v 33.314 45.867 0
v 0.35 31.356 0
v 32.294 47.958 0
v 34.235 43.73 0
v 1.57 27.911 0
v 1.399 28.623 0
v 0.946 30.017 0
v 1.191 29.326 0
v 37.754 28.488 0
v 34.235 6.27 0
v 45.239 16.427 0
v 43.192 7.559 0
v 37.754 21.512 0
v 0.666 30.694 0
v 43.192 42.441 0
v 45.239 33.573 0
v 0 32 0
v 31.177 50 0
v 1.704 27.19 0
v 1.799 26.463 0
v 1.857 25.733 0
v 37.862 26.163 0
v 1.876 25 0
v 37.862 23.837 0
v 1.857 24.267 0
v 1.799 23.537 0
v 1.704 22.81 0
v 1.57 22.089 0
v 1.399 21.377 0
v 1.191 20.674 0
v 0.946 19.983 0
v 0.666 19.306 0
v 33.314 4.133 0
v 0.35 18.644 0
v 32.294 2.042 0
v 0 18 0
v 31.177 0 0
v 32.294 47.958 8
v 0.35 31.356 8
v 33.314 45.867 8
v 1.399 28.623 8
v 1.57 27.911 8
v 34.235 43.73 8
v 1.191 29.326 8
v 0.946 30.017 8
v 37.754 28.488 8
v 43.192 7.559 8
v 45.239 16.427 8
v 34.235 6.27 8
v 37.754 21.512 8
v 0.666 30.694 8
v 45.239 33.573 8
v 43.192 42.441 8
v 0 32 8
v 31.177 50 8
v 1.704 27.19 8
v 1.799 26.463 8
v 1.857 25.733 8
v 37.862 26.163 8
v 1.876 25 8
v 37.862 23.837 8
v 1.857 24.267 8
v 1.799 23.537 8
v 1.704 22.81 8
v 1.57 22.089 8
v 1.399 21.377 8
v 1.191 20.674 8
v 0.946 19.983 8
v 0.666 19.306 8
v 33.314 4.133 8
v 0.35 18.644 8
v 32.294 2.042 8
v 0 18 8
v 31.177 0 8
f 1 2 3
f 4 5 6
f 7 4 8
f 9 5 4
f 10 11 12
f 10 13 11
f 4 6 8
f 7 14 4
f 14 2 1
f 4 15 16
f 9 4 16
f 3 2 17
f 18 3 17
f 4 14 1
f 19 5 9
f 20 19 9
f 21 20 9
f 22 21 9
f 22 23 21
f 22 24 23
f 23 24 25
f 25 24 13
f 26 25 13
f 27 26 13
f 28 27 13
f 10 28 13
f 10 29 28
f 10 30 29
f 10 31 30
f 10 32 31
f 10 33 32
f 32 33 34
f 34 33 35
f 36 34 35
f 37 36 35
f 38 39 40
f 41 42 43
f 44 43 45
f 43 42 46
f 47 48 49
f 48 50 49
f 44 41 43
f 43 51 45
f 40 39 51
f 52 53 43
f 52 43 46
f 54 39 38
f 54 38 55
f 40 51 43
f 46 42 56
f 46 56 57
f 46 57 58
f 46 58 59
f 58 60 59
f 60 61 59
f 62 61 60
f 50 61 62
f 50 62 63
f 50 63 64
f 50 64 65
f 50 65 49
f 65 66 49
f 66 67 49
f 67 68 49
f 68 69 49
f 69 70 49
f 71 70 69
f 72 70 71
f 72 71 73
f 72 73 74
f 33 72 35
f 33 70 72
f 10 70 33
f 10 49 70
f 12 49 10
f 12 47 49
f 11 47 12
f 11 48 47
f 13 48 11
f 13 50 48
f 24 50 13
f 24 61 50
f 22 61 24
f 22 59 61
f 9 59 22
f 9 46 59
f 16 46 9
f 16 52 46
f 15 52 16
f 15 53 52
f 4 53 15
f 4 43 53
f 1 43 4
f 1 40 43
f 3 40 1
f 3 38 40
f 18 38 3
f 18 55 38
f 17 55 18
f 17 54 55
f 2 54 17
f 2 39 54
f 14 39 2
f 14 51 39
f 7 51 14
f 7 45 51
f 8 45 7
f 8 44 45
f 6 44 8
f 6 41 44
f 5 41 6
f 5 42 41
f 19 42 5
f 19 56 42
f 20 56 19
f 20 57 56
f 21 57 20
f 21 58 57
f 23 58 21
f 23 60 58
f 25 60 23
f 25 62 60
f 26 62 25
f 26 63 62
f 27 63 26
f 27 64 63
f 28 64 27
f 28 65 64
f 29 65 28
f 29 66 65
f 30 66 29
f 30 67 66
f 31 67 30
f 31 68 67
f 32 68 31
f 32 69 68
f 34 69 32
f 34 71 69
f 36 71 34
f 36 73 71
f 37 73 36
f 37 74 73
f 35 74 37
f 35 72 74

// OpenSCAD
$fn = 32;

// ----------------------------------------------------------------------
// Gear sector: 2 teeth on 60 degrees
// ----------------------------------------------------------------------

// --- parameters (mm) ---
sector_angle = 60;        // sector angle, degrees
root_r = 50;              // root circle radius
tooth_h = 8;              // tooth height over the root circle
teeth = 2;                // number of teeth on the sector
hub_r = 14;               // hub bore radius
plate_t = 8;              // sector thickness, Z
arc_step = 3;             // sampling step of the root/hub arcs, degrees

tip_r = root_r + tooth_h;  // tip circle radius

profile = [[31.177, 0], [32.294, 2.042], [33.314, 4.133], [34.235, 6.27], [43.192, 7.559], [45.239, 16.427], [37.754, 21.512], [37.862, 23.837], [37.862, 26.163], [37.754, 28.488], [45.239, 33.573], [43.192, 42.441], [34.235, 43.73], [33.314, 45.867], [32.294, 47.958], [31.177, 50], [0, 32], [0.35, 31.356], [0.666, 30.694], [0.946, 30.017], [1.191, 29.326], [1.399, 28.623], [1.57, 27.911], [1.704, 27.19], [1.799, 26.463], [1.857, 25.733], [1.876, 25], [1.857, 24.267], [1.799, 23.537], [1.704, 22.81], [1.57, 22.089], [1.399, 21.377], [1.191, 20.674], [0.946, 19.983], [0.666, 19.306], [0.35, 18.644], [0, 18]];  // primary outline, 37 points, counter clockwise

// --- the one profile operation ---
linear_extrude(height = plate_t) polygon(points = profile);
